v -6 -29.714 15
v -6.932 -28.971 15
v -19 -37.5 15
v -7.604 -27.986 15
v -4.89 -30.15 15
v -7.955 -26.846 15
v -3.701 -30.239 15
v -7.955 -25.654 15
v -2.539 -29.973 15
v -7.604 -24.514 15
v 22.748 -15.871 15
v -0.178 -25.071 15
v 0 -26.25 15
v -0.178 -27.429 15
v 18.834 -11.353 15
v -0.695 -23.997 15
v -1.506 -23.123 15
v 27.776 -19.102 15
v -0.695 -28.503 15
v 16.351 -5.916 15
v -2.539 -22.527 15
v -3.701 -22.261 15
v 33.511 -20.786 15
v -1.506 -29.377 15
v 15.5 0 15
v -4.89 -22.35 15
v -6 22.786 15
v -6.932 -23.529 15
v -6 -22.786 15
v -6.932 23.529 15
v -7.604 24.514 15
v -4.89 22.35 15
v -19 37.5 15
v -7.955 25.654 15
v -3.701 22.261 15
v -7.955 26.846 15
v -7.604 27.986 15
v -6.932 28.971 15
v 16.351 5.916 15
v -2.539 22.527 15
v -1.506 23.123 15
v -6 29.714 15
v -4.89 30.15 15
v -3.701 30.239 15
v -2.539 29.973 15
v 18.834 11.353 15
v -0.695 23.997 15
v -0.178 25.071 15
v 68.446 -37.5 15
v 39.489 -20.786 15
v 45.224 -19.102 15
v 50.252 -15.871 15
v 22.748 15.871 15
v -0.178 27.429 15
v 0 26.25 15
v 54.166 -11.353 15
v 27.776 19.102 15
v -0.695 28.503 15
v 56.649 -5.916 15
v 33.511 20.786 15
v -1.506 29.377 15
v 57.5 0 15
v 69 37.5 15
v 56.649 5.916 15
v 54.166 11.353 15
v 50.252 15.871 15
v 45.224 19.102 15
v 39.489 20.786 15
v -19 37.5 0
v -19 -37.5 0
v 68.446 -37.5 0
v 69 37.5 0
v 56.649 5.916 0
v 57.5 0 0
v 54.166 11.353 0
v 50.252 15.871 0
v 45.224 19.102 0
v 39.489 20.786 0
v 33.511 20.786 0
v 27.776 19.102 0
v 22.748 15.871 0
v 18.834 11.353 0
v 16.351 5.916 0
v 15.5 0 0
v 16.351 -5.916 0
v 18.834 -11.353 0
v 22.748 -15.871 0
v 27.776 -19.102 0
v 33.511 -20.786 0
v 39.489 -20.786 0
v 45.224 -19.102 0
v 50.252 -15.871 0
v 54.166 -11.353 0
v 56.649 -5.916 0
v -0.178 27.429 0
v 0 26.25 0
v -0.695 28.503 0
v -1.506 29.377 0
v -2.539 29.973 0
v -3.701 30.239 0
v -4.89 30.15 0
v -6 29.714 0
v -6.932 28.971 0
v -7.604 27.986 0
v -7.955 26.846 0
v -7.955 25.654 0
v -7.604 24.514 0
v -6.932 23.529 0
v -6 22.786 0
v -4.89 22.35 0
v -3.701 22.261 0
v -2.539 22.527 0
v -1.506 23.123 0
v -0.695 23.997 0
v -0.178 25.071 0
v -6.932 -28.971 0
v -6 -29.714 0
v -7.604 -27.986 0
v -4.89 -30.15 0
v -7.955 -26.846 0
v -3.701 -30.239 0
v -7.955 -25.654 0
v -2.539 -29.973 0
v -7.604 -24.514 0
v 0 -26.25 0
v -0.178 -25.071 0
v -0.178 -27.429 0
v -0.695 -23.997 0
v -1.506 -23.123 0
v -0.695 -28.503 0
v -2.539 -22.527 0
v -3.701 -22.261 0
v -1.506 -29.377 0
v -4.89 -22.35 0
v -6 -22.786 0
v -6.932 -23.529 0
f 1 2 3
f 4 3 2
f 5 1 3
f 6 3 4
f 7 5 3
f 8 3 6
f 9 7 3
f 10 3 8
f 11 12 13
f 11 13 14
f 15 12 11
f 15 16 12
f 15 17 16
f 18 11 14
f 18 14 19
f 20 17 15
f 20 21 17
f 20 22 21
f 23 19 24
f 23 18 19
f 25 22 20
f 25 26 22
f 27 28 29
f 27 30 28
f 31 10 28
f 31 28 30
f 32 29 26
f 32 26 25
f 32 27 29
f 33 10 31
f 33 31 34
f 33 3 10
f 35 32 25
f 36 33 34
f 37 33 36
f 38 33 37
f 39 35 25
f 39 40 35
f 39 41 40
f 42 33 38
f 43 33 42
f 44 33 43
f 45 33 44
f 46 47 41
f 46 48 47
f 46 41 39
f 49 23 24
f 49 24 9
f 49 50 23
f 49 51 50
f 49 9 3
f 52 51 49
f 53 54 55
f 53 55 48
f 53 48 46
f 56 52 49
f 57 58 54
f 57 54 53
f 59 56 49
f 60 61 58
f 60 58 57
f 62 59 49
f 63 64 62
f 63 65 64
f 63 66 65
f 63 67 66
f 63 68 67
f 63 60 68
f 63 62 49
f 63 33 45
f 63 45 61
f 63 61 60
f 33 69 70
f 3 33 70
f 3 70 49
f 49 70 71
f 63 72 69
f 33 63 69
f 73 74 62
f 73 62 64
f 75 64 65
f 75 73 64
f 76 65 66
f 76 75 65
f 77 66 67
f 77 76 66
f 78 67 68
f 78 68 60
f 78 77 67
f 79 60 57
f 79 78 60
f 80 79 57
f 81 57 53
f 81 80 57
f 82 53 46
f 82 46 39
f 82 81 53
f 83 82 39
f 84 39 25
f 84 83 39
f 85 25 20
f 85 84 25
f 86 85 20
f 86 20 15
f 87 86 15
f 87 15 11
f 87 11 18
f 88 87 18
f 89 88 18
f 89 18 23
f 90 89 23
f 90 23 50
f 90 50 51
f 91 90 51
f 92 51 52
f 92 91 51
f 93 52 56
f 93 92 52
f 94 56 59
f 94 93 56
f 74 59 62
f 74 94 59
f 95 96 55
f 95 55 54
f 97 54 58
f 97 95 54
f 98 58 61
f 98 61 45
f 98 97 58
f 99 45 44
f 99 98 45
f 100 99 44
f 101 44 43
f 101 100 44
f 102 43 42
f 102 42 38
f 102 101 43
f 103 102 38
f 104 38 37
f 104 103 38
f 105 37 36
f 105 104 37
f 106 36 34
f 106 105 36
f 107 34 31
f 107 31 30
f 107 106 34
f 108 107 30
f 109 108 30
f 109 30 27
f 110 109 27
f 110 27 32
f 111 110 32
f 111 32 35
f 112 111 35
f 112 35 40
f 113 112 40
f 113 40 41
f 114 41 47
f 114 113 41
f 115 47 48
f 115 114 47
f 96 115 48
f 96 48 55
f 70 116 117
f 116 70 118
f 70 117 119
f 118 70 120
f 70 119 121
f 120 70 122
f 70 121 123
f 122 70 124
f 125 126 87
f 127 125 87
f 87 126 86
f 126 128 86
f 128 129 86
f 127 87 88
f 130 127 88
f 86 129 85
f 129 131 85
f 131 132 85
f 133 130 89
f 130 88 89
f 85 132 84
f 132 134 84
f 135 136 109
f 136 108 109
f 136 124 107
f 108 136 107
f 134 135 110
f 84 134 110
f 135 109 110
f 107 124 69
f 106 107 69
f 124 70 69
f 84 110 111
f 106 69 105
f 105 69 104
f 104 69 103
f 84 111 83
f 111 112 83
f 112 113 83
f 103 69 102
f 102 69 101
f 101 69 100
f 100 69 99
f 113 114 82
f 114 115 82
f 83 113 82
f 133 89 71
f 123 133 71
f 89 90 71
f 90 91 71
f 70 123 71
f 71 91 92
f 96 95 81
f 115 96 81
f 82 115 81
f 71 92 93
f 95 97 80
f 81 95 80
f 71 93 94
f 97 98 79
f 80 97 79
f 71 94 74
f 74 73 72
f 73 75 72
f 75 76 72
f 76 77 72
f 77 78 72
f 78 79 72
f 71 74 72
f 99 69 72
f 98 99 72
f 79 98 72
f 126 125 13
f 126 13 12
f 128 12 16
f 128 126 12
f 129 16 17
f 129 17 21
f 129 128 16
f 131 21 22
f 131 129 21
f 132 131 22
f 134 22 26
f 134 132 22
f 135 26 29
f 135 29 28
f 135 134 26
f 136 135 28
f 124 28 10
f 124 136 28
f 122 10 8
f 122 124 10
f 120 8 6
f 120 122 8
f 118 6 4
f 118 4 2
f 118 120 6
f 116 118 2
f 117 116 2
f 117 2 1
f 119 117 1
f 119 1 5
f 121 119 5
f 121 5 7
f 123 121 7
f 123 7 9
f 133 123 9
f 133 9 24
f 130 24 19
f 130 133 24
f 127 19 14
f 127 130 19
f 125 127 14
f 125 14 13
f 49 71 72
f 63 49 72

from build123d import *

# Parameters (mm, degrees)
SKETCH_1_R      = 4
SKETCH_1_R_2    = 21
EXTRUDE_1_DEPTH = 15


with BuildPart() as part:
    # 草图1 → 凸台-拉伸1 (new body)
    with BuildSketch(Plane.XY):
        Polygon((11, 37.5), (-19, 37.5), (-19, 26.25), (-19, 0), (-19, -37.5), (19, -37.5), (68.446354823, -37.5), (69, 37.5), (19, 37.5), align=None)
        with Locations((-4, -26.25)):
            Circle(SKETCH_1_R, mode=Mode.SUBTRACT)
        with Locations((-4, 26.25)):
            Circle(SKETCH_1_R, mode=Mode.SUBTRACT)
        with Locations((36.5, 0)):
            Circle(SKETCH_1_R_2, mode=Mode.SUBTRACT)
    extrude(amount=EXTRUDE_1_DEPTH)


solid = part.part
